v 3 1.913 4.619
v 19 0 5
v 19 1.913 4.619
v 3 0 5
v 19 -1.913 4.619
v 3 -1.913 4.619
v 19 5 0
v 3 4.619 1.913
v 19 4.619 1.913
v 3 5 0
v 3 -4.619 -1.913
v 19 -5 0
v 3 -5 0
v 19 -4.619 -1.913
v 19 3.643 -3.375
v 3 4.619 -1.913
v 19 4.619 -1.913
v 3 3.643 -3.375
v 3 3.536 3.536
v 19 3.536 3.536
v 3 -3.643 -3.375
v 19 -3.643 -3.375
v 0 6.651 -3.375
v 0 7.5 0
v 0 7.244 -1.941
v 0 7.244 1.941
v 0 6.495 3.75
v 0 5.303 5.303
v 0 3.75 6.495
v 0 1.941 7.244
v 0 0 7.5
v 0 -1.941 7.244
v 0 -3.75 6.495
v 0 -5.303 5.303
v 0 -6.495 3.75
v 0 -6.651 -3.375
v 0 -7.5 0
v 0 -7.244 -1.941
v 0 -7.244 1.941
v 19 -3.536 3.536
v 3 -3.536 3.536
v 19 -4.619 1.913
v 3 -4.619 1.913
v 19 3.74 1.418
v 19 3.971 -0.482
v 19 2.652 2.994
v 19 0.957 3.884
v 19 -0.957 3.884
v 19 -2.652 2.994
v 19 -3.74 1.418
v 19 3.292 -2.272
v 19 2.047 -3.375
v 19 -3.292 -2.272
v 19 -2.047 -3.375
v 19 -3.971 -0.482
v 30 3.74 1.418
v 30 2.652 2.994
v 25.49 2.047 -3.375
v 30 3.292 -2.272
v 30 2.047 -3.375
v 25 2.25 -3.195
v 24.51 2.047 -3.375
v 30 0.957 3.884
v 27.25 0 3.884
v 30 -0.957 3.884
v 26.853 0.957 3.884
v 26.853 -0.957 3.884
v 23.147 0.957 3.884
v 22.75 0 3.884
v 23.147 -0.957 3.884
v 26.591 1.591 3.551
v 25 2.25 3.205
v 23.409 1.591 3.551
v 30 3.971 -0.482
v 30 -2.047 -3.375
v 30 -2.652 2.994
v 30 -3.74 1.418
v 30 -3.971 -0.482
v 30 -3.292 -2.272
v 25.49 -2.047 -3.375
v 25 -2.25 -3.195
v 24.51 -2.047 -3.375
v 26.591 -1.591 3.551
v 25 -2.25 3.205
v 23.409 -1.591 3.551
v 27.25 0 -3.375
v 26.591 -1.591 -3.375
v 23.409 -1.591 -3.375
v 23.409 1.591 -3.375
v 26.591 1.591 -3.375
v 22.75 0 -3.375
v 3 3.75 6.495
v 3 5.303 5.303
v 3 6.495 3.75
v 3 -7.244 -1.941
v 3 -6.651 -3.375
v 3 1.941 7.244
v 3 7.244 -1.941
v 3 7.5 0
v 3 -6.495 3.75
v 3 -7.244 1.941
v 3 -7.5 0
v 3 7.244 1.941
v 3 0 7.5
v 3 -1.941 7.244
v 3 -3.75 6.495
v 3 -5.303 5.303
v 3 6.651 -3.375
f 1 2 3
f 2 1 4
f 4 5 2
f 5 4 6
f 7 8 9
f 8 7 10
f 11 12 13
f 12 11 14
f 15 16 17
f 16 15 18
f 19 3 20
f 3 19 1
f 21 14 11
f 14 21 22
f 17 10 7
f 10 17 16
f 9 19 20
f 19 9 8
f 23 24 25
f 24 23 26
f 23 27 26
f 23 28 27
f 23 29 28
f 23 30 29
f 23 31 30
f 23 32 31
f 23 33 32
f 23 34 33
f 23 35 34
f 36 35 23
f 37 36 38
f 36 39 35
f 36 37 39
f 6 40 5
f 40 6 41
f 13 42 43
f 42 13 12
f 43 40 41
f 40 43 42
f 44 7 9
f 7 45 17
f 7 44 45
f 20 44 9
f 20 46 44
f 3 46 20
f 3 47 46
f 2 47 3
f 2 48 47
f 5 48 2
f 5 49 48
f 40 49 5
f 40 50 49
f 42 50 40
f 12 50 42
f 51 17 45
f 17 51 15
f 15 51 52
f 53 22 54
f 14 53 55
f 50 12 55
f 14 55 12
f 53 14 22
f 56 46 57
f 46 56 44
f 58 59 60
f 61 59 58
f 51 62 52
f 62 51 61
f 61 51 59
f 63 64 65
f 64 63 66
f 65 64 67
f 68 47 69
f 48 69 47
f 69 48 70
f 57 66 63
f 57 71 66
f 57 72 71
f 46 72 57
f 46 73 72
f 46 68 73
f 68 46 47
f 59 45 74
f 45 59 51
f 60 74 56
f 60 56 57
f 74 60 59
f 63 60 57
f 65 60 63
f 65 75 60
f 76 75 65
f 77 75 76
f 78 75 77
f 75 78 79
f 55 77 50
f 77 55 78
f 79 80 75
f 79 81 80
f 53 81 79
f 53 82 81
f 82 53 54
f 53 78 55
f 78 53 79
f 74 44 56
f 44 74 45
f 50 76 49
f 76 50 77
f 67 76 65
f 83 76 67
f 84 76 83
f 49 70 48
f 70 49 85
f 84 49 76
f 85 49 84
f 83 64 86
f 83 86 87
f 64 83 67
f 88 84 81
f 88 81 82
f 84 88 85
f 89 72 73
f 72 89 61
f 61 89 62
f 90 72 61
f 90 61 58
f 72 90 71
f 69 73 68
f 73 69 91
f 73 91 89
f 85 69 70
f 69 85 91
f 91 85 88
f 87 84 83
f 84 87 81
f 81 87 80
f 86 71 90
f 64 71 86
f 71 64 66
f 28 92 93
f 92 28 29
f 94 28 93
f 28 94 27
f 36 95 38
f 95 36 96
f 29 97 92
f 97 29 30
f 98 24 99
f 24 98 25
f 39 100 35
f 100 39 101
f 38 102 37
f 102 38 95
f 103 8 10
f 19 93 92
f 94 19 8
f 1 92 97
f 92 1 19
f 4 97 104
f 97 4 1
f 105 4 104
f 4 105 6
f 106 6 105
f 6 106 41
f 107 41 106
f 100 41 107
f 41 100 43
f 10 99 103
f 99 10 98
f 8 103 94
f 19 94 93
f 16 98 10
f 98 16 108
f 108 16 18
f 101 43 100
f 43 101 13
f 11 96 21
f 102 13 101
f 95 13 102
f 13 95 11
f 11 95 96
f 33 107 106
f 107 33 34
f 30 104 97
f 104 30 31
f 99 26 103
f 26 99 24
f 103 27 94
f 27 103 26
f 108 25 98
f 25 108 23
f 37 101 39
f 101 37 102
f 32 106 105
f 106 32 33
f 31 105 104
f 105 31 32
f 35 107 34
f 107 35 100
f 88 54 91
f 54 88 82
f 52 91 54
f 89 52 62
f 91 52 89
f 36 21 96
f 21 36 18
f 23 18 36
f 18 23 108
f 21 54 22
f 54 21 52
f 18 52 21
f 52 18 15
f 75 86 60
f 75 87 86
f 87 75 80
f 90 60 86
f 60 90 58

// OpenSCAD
// file: ../../params.scad
// GLOBAL
hole_radius = 5;
peg_radius = 4.5;

// MAGNET
mag_height = 6.4;
mag_ring_ir = 50;
mag_ring_or = 102;
mag_count = 16;

// BEARING
bearing_height = 17;
bearing_ir = 33;
bearing_or = 44;

// STATOR
stator_height = 20;
stator_inner_height = 10;
stator_bearing_inset = (stator_height/2) - 1;
stator_count = 6;
stator_incidence = 360/stator_count;
stator_radius = 115;
stator_tab_width = 10;
stator_tab_offset = 50;
stator_wiring_gap = 25;
stator_wiring_gap_inset = stator_radius - (stator_wiring_gap + 10);
stator_outer_tab_extrude = 15;
stator_outer_tab_width = 30;
stator_notch = 15;
stator_notch_width = 5;
coil_edge = 80;

// ROTOR & ROTOR CAP
rotor_height = 10;
rotor_inner_height = 3;
rotor_radius = 105;
rotor_inner_diameter = 25;
rotor_count = 8;
rotor_incidence = 360/rotor_count;
rotor_tie_hole_offset = 30;
rotor_notch = 10;
rotor_notch_height = 2;

rotor_cap_radius = 50;
rotor_cap_peg_radius = 35;
rotor_cap_inner_radius = 10;
rotor_cap_height = 10;
rotor_cap_insert_height = 10;
rotor_cap_bearing_inset = (bearing_height + rotor_inner_height) - rotor_cap_height;
rotor_plate_height = 5;
blade_holder_edge = 20;

// ROTOR EDGE TIE
rotor_edge_tie_length = 40;
rotor_edge_tie_width = 20;
rotor_edge_tie_inner_height = 5;
rotor_edge_tie_height = 15;
rotor_edge_tie_peg_inset = 10;
// file: wind_params.scad
/*
 * Copyright (c) 2012 Haydn Vesta
 * 
 * See the file license.txt for copying permission.
 *
 */


// FRAME
frame_thickness = 10;

// BLADE
blade_length = 1000;
blade_width = 40;
blade_base_width = 30;
blade_thickness = 3;
blade_count = 3;

// BEARING
bearing_ir = 35;
bearing_or = 55;
bearing_height = 25;

// POLE CAP
pole_radius = 12.7;
pole_cap_height = 40;
swivel_ir = 22.5;
swivel_or = 32.5;
// main file
/*
 * Copyright (c) 2012 Haydn Vesta
 * 
 * See the file license.txt for copying permission.
 *
 */

include <wind_params.scad>
include <../../params.scad>


pin_height = frame_thickness + stator_height + (hole_radius * 2);

module pin_unadjusted() {
  difference() {
//    cylinder(h=pin_height, r=peg_radius);
union() {
cylinder(h=19, r=5);
cylinder(h=30, r=4);
}
    translate([-peg_radius, 0, 25]) {
      rotate([0, 90, 0]) cylinder(h=peg_radius*2, r=peg_radius/2);
    }
  }
  cylinder(h=3, r=peg_radius + 3);
}

module pin() {
  difference() {
    rotate([0, 90, 0]) pin_unadjusted();
    translate([0, -peg_radius - 3, peg_radius*-2.75]) 
      cube([pin_height + 1, (peg_radius*2) + 6, peg_radius*2]);
  }
}

pin();
